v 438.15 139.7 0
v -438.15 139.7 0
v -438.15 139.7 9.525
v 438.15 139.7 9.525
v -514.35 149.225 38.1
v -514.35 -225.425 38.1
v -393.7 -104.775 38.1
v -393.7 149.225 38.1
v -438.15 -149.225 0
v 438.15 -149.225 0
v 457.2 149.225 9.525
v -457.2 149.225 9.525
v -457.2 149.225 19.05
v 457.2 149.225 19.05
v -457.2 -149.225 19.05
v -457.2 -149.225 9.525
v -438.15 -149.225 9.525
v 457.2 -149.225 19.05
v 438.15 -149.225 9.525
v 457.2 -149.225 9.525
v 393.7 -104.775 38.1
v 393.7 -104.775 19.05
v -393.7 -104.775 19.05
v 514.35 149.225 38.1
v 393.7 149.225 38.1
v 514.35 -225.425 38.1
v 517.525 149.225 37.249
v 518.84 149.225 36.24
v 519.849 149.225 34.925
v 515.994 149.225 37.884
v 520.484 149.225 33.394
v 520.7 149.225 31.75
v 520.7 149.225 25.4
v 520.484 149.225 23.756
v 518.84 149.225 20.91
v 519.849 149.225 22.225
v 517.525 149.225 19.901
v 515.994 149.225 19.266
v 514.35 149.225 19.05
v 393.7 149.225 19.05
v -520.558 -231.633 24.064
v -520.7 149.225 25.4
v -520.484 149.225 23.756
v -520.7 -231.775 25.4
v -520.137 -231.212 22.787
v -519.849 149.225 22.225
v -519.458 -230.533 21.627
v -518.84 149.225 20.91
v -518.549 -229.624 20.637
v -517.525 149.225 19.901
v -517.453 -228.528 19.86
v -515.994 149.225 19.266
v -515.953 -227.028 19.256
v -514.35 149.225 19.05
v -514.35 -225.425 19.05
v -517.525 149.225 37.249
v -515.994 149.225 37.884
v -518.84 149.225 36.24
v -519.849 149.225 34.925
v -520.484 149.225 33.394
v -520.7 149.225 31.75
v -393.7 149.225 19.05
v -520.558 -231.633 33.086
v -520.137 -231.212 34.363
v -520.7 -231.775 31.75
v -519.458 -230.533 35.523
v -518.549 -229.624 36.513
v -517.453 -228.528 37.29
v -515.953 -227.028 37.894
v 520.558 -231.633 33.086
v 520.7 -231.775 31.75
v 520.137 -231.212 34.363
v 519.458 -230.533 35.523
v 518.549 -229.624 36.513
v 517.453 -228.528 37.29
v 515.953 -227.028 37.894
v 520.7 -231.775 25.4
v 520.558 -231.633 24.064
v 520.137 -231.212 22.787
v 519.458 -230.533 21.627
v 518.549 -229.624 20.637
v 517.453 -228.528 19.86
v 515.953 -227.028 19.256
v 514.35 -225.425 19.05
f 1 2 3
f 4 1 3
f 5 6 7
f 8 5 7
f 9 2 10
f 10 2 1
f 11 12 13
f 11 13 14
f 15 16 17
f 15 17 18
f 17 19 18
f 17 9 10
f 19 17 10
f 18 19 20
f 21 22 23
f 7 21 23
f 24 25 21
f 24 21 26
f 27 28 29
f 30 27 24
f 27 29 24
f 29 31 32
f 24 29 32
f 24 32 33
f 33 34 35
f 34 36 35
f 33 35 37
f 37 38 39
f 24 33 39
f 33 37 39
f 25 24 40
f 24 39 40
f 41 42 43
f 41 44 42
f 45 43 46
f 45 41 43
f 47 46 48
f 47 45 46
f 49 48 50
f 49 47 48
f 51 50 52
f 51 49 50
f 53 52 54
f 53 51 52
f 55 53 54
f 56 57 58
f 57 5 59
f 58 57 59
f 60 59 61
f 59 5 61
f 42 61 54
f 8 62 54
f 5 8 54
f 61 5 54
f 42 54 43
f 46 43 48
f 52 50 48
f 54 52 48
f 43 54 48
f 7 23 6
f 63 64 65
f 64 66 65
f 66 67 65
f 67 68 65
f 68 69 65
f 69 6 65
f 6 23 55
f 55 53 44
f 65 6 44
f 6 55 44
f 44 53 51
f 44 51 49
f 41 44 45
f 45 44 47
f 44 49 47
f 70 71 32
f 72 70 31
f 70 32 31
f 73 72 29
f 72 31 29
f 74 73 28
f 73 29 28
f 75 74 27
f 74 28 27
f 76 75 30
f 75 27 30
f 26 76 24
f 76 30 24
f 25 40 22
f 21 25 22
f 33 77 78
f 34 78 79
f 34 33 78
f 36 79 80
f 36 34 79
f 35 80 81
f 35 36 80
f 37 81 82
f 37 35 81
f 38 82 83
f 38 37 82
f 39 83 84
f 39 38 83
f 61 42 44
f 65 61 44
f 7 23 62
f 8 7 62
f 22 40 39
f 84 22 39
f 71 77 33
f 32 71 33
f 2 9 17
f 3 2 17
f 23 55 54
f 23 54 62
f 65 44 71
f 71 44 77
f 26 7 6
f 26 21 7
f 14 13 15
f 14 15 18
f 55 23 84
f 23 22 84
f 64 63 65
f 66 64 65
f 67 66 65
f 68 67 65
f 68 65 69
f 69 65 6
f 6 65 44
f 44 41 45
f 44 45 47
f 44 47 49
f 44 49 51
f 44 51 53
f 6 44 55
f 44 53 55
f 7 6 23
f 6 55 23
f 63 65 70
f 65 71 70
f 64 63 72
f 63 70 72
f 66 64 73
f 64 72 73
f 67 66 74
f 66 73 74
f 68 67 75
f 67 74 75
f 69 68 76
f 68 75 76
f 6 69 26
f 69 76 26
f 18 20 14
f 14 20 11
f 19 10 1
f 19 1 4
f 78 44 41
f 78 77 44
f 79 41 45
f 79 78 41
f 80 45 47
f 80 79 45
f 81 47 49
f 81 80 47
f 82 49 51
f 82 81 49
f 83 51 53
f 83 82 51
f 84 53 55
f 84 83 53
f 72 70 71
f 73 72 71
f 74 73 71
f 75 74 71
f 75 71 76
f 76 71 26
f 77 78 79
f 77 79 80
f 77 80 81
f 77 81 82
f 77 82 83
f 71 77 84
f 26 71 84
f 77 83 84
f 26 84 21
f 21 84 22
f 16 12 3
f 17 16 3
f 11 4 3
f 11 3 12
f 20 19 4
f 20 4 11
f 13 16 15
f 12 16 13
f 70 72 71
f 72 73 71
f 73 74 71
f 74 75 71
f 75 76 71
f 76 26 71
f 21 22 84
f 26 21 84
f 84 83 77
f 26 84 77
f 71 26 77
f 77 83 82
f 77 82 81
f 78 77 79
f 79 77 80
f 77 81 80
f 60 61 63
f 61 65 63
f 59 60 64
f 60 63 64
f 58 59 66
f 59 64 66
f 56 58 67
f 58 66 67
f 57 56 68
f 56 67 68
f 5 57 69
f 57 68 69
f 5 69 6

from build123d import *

# Parameters (mm, degrees)
F0_W      = 914.4
F0_H      = 298.45
F1_DEPTH  = 19.05
F2_W      = 9.525
F2_H      = 9.525
F3_DEPTH  = 914.401
F4_W      = 19.05
F4_H      = 9.525
F5_DEPTH  = 298.451
F7_DEPTH  = 19.05
F9_DEPTH  = 19.05
F11_DEPTH = 19.05
F12_R     = 6.35
F12_2_R   = 6.35
F12_3_R   = 6.35


with BuildPart() as f1:
    # F0 (on Top) → F1 (new body)
    with BuildSketch(Plane.XY):
        Rectangle(F0_W, F0_H)
    extrude(amount=F1_DEPTH)

    # F2 (on face) → F3 (cut, through all)
    with BuildSketch(Plane.YZ.offset(457.2)):
        with Locations((144.4625, 4.7625)):
            Rectangle(F2_W, F2_H)
    extrude(amount=-F3_DEPTH, mode=Mode.SUBTRACT)

    # F4 (on face) → F5 (cut, through all)
    with BuildSketch(Plane.XZ.offset(149.225)):
        with Locations((-447.675, 4.7625)):
            Rectangle(F4_W, F4_H)
        with Locations((447.675, 4.7625)):
            Rectangle(F4_W, F4_H)
    extrude(amount=-F5_DEPTH, mode=Mode.SUBTRACT)


with BuildPart() as f7:
    # F6 (on face) → F7 (new body)
    with BuildSketch(Plane.XY.offset(19.05)):
        Polygon((393.7, -104.775), (-393.7, -104.775), (-520.7, -231.775), (520.7, -231.775), align=None)
    extrude(amount=F7_DEPTH)

    # F12
    f12_edges = [f7.edges().sort_by_distance(p)[0] for p in [
        (0, -231.775, 38.1),
        (0, -231.775, 19.05),
    ]]
    fillet(f12_edges, radius=F12_R)


with BuildPart() as f9:
    # F8 (on face) → F9 (new body)
    with BuildSketch(Plane.XY.offset(19.05)):
        Polygon((-393.7, 149.225), (-520.7, 149.225), (-520.7, -231.775), (-393.7, -104.775), align=None)
    extrude(amount=F9_DEPTH)

    # F12#3
    f12_3_edges = [f9.edges().sort_by_distance(p)[0] for p in [
        (-520.7, -41.275, 38.1),
        (-520.7, -41.275, 19.05),
    ]]
    fillet(f12_3_edges, radius=F12_3_R)


with BuildPart() as f11:
    # F10 (on face) → F11 (new body)
    with BuildSketch(Plane.XY.offset(19.05)):
        Polygon((520.7, 149.225), (393.7, 149.225), (393.7, -104.775), (520.7, -231.775), align=None)
    extrude(amount=F11_DEPTH)

    # F12#2
    f12_2_edges = [f11.edges().sort_by_distance(p)[0] for p in [
        (520.7, -41.275, 19.05),
        (520.7, -41.275, 38.1),
    ]]
    fillet(f12_2_edges, radius=F12_2_R)


solid = Compound([f1.part, f7.part, f9.part, f11.part])
